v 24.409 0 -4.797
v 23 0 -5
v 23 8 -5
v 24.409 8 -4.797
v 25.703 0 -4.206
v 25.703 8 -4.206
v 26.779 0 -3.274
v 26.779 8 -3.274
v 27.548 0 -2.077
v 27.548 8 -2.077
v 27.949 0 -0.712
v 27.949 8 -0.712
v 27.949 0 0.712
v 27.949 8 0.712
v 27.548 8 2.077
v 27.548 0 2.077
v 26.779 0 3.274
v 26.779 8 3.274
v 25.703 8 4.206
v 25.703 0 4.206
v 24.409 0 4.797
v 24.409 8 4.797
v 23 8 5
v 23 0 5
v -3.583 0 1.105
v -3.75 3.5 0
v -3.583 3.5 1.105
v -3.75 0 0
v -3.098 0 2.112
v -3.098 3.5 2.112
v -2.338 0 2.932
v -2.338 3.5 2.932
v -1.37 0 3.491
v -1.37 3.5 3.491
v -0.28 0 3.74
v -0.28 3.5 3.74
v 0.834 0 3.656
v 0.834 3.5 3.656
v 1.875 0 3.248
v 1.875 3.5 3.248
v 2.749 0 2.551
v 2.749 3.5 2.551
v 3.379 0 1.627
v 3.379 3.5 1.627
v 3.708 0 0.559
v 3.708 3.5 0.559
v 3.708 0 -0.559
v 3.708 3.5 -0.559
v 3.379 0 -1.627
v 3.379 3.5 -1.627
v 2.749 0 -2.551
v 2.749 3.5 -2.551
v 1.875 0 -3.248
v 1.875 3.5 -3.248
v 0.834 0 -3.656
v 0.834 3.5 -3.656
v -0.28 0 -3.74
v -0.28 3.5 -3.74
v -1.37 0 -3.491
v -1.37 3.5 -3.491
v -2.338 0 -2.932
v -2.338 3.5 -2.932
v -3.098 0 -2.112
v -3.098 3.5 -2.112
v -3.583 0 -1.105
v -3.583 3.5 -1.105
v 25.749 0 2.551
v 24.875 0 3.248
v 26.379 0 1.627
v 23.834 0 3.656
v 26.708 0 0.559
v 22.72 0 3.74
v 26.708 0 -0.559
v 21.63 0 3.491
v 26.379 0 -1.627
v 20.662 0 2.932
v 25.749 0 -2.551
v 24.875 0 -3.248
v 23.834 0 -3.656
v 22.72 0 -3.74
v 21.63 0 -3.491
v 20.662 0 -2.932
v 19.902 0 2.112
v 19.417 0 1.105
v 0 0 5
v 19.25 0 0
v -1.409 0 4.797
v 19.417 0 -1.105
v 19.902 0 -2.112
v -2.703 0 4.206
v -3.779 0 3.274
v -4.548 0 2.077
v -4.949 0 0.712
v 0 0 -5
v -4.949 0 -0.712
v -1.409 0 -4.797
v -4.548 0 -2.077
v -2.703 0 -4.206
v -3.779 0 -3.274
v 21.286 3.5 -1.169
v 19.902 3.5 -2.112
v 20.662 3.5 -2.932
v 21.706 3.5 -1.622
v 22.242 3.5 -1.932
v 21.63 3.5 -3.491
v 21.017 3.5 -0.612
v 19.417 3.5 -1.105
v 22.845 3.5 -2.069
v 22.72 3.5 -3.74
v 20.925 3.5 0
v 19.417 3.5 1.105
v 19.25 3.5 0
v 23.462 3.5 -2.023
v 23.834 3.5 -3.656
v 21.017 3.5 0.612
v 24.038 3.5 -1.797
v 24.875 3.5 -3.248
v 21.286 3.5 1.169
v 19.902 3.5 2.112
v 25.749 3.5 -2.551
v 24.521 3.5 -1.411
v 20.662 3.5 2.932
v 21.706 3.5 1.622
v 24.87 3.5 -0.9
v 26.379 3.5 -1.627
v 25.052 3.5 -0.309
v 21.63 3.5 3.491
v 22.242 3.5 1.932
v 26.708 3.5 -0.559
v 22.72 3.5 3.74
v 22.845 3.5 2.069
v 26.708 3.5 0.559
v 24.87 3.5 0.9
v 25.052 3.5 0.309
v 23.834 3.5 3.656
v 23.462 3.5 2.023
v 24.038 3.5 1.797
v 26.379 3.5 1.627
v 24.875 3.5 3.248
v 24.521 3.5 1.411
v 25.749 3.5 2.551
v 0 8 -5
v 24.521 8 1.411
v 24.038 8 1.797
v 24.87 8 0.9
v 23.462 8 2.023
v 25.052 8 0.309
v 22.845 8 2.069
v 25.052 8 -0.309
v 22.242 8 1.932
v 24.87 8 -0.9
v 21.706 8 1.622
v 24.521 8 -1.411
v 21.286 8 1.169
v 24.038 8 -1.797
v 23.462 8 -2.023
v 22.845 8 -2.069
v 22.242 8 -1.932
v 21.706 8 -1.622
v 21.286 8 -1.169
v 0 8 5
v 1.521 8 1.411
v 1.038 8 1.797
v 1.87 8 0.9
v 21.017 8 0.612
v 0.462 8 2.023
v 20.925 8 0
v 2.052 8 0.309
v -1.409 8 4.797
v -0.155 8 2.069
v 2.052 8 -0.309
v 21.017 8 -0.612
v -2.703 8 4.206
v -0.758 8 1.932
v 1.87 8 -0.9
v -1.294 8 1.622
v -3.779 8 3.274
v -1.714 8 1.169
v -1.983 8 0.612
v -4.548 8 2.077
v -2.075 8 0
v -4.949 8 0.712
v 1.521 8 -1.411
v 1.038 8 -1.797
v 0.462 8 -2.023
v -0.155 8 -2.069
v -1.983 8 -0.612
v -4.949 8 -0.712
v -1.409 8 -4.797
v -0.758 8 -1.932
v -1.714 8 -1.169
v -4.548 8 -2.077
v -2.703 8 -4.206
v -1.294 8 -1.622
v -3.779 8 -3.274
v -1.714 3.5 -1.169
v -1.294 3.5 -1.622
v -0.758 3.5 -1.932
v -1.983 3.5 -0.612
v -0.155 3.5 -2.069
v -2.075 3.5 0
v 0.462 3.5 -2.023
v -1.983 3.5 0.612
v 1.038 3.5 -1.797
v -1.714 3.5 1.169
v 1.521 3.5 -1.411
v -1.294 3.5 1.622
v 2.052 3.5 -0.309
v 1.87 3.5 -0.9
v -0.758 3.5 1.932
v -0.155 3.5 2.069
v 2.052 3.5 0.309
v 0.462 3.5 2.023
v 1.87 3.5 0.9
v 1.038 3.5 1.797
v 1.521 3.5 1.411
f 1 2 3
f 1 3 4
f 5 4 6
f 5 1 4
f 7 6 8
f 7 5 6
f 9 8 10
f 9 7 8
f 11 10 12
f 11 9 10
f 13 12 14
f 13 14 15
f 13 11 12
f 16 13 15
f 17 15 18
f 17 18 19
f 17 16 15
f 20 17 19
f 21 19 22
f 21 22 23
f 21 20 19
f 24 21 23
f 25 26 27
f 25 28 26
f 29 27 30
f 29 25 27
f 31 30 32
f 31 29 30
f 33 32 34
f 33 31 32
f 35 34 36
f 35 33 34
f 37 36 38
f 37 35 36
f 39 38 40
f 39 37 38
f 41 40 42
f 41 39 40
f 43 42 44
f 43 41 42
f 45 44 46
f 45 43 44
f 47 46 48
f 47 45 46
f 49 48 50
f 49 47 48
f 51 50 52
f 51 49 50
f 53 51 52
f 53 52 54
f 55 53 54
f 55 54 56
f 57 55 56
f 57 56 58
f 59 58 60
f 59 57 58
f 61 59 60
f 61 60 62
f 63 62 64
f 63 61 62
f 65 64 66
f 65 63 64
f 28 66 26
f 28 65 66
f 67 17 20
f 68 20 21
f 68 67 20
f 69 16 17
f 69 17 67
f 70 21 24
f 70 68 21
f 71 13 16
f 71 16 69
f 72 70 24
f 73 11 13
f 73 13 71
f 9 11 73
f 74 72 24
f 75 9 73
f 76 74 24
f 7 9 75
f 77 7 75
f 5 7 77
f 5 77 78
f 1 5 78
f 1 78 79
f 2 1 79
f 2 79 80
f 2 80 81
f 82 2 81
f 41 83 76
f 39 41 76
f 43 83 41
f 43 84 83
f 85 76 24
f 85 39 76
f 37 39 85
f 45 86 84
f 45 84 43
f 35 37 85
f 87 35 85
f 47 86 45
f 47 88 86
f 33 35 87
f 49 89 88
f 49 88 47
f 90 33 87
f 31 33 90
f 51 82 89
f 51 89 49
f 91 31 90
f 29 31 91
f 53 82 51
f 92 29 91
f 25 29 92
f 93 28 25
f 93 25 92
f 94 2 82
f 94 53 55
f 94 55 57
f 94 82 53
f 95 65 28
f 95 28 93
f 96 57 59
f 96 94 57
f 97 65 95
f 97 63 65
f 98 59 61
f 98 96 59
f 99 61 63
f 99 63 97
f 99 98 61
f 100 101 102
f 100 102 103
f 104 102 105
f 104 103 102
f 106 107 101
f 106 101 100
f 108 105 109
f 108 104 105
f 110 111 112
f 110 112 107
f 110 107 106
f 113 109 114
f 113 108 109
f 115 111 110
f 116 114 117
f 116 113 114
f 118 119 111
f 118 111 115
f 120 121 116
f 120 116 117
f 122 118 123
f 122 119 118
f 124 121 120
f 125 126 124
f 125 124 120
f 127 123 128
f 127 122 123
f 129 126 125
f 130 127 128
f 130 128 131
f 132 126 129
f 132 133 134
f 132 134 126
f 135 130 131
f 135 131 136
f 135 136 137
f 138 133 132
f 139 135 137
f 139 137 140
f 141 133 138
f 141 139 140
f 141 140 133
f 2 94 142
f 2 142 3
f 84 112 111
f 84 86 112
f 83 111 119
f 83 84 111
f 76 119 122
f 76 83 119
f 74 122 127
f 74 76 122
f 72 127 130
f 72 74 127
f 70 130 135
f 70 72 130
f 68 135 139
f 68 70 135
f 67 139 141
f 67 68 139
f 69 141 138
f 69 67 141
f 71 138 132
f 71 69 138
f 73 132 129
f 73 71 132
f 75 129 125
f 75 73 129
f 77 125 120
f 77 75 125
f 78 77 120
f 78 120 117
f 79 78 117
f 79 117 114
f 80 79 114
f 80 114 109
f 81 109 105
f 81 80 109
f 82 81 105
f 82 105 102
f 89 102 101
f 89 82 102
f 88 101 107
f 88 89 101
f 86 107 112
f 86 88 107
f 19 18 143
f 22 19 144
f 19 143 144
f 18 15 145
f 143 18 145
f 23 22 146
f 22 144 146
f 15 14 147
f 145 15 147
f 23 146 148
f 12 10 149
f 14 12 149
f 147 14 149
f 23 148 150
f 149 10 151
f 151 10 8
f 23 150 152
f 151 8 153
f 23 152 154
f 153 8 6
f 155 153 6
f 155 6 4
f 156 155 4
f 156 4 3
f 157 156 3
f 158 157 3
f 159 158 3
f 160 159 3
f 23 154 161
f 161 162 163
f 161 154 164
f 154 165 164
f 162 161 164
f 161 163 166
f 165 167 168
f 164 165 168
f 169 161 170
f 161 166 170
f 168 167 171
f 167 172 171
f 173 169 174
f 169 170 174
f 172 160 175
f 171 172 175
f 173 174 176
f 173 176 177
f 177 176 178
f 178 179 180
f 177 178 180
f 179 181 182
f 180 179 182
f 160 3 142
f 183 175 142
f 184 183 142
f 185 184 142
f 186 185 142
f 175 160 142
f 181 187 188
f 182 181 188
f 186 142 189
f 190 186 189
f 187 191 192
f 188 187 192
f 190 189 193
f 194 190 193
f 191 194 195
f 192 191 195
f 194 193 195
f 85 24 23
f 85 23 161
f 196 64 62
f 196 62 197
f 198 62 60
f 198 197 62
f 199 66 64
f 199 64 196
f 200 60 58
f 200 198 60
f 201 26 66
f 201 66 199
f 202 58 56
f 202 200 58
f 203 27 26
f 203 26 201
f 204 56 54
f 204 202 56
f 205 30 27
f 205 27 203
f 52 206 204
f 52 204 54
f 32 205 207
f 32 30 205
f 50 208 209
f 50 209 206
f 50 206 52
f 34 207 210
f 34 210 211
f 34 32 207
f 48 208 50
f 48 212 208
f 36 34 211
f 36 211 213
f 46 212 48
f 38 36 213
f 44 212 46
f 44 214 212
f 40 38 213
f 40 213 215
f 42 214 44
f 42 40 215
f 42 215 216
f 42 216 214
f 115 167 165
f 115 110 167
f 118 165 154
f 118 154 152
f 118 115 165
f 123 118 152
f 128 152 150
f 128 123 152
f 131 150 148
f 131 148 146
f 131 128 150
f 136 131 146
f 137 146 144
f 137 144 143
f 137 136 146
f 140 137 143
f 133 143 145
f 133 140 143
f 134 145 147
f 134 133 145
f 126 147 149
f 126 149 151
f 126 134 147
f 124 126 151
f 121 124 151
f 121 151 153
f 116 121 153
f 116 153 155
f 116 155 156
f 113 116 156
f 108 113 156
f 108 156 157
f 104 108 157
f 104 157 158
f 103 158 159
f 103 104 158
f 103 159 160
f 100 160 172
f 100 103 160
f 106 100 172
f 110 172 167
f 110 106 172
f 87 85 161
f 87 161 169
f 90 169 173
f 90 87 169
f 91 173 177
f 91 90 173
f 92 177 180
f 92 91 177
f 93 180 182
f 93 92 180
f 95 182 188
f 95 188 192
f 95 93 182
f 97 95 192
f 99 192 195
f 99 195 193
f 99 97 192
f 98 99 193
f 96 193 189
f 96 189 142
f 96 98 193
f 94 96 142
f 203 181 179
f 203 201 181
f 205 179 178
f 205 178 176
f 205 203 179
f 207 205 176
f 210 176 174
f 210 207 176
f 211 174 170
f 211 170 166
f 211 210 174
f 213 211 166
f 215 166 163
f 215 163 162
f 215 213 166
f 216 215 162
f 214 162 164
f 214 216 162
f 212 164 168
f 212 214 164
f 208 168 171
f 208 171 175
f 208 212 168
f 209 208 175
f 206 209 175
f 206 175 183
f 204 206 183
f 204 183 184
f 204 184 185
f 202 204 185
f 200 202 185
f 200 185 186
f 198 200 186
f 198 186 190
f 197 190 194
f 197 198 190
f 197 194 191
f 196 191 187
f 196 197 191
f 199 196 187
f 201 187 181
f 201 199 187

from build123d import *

# Parameters (mm, degrees)
EXTRUDE_1_DEPTH = 8


with BuildPart() as part:
    # 草图1 → 凸台-拉伸1 (new body)
    with BuildSketch(Plane(origin=(0, 0, 0), x_dir=(1, 0, 0), z_dir=(0, 1, 0))):
        with BuildLine():
            Line((0, 5), (23, 5))
            ThreePointArc((23, 5), (28, 0), (23, -5))
            Line((23, -5), (0, -5))
            ThreePointArc((0, -5), (-5, 0), (0, 5))
        make_face()
    extrude(amount=EXTRUDE_1_DEPTH)

    # 草图2 → 切除-旋转1 (revolve, cut)
    with BuildSketch(Plane.XY):
        Polygon((0, 8), (-2.075, 8), (-2.075, 3.5), (-3.75, 3.5), (-3.75, 0), (0, 0), align=None)
    revolve(axis=Axis((0, 0, 0), (0, 1, 0)), mode=Mode.SUBTRACT)

    # 草图3 → 切除-旋转2 (revolve, cut)
    with BuildSketch(Plane.XY):
        Polygon((23, 8), (20.925, 8), (20.925, 3.5), (19.25, 3.5), (19.25, 0), (23, 0), align=None)
    revolve(axis=Axis((23, 0, 0), (0, 1, 0)), mode=Mode.SUBTRACT)


solid = part.part
